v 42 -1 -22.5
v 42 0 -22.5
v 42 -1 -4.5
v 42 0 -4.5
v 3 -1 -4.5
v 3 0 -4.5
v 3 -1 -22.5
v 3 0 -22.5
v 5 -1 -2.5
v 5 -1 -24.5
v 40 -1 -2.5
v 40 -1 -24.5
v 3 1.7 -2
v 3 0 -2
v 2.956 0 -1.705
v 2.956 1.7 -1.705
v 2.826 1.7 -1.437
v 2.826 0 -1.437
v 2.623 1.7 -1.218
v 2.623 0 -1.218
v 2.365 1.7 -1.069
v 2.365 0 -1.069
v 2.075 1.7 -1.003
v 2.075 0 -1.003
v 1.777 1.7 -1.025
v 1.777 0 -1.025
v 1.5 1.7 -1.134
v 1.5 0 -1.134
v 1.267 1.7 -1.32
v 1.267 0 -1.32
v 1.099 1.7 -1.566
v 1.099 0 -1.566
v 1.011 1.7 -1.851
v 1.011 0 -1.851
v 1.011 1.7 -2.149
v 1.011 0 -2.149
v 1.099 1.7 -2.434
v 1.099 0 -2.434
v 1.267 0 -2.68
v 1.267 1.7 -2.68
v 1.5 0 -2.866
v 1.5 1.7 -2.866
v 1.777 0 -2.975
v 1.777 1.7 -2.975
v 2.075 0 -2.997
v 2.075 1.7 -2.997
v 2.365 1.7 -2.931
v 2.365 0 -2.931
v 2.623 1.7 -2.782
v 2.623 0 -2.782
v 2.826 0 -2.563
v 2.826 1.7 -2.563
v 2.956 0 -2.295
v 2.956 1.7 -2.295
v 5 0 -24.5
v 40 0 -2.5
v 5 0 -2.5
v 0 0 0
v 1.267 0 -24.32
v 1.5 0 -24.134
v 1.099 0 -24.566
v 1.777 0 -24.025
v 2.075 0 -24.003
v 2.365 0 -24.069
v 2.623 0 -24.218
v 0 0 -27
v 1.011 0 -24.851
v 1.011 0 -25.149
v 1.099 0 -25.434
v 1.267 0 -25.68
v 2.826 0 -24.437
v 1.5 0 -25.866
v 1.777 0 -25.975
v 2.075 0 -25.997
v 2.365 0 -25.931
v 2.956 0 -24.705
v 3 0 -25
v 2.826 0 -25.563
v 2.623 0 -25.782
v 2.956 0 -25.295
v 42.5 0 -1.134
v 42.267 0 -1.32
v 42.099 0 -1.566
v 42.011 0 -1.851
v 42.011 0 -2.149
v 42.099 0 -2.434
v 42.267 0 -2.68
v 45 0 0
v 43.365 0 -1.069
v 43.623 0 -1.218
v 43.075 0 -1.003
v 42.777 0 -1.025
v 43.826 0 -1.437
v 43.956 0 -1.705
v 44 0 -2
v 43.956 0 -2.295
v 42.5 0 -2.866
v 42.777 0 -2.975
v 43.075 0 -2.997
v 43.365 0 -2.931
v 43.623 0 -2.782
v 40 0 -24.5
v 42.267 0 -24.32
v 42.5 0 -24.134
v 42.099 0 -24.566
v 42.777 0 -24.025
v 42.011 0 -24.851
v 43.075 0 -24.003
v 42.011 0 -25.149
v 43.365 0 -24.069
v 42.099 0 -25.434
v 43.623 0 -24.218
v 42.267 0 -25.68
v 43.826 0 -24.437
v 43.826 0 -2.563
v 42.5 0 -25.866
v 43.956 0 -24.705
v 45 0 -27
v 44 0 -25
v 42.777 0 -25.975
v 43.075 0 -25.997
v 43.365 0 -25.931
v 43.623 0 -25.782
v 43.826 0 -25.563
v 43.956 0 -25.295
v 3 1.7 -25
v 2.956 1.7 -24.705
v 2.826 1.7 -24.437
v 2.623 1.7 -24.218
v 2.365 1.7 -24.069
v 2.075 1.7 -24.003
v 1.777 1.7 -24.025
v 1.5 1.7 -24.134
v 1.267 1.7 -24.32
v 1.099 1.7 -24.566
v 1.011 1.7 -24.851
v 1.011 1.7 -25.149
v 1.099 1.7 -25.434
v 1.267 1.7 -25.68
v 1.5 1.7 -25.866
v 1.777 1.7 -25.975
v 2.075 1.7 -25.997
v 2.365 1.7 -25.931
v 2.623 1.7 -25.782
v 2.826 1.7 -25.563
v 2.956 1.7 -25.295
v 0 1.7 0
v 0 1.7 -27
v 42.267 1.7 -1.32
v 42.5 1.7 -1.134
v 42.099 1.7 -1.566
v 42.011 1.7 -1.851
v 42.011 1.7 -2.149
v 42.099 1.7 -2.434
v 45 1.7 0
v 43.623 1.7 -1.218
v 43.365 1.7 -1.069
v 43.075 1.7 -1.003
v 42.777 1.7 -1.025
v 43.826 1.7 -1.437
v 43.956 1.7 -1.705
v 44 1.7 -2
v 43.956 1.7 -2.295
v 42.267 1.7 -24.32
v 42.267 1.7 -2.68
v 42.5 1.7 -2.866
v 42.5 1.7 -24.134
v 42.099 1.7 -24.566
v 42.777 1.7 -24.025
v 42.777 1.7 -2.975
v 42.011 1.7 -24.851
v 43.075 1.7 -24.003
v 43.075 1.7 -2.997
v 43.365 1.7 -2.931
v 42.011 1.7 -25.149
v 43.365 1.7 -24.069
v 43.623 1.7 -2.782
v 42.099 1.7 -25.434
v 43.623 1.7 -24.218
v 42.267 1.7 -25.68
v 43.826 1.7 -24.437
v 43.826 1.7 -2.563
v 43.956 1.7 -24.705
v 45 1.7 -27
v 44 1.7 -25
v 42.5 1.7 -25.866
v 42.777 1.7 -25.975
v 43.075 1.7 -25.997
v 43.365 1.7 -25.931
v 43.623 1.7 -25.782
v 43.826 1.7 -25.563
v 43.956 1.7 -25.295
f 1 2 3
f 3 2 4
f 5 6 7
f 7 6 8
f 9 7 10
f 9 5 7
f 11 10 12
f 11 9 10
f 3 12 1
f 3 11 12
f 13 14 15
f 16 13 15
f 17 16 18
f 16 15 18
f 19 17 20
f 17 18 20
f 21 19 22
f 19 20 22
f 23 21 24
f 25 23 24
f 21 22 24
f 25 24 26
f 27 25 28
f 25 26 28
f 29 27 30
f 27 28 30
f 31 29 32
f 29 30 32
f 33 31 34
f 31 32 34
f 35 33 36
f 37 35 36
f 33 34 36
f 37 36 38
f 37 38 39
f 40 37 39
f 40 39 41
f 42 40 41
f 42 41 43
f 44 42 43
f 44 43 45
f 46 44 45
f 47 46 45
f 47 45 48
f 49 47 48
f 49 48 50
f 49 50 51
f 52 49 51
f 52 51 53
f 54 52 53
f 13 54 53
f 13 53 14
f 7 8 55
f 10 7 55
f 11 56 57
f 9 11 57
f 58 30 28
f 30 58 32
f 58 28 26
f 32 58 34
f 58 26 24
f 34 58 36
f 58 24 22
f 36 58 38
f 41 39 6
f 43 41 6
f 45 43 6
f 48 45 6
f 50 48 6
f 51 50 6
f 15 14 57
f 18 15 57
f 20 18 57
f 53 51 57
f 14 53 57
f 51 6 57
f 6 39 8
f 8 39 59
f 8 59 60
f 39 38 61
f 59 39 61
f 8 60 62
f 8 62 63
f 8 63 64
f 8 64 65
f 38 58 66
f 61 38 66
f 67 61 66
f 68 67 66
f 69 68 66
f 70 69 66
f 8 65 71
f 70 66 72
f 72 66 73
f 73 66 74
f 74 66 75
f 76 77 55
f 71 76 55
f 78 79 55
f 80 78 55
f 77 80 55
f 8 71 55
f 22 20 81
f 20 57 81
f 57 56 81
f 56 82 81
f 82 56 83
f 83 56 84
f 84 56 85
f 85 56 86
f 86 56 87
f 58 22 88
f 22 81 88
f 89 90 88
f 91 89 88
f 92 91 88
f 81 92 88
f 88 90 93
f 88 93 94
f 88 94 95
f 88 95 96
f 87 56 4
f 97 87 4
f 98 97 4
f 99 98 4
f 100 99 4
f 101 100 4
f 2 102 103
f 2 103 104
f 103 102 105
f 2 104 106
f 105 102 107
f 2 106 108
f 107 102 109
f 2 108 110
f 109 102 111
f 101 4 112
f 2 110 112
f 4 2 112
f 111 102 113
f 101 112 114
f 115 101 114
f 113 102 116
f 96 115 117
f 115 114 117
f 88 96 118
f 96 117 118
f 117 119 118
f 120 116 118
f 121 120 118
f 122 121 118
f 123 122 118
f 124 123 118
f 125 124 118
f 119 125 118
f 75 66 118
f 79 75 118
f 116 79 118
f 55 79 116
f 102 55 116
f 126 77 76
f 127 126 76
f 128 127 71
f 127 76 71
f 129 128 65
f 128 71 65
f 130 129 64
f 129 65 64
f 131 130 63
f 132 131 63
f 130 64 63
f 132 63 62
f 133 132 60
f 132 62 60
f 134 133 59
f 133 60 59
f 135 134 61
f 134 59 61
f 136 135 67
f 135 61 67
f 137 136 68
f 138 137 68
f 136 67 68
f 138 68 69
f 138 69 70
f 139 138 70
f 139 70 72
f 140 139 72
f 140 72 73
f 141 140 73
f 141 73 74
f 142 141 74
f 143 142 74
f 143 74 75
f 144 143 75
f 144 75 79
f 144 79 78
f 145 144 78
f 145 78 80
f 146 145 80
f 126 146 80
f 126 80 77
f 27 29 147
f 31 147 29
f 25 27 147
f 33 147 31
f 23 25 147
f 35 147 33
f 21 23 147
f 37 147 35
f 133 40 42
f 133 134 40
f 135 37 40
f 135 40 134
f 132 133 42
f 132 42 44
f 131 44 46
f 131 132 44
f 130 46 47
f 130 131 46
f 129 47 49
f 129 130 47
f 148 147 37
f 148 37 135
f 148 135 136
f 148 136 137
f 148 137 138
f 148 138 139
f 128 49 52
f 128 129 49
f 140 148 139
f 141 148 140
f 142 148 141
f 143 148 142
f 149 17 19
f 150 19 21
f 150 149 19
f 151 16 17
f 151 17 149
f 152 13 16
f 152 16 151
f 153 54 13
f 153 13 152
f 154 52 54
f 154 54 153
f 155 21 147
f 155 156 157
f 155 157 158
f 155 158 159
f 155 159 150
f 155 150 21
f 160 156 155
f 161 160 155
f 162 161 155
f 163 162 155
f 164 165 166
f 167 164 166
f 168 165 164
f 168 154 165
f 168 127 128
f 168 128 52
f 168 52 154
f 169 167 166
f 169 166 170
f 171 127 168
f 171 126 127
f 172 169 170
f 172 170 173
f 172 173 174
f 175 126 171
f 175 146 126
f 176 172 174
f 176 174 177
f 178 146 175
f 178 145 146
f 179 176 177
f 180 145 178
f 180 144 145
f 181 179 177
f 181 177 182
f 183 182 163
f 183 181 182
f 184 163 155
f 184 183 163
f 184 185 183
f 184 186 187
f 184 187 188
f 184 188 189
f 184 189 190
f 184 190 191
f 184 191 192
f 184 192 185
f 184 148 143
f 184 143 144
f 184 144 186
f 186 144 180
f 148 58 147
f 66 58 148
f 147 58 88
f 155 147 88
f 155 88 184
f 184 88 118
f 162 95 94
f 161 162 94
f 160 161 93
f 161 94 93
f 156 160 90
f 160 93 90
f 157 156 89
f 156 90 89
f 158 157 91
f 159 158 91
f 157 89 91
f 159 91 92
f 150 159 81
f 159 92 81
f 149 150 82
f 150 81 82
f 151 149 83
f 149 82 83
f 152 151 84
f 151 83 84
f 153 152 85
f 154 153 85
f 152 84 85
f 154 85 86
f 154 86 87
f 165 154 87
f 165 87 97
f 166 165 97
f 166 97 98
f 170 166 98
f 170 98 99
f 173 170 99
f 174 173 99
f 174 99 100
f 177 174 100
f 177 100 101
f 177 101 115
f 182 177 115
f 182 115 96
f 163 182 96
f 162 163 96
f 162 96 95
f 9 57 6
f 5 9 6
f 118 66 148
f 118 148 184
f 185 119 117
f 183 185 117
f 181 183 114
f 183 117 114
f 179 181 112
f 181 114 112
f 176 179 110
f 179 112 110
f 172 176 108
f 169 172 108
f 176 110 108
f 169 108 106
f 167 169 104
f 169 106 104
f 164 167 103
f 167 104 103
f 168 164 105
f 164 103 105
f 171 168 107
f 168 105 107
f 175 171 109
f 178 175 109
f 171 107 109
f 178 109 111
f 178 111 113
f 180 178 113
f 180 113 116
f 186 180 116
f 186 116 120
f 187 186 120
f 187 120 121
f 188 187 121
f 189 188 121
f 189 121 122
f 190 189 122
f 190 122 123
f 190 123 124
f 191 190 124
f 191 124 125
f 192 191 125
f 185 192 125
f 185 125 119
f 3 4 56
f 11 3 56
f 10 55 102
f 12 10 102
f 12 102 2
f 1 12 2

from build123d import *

# Parameters (mm, degrees)
ESBO_O1_W                = 45
ESBO_O1_H                = 27
RESSALTO_EXTRUS_O1_DEPTH = 1.7
RESSALTO_EXTRUS_O2_DEPTH = 1
ESBO_O3_R                = 1
CORTE_EXTRUS_O1_DEPTH    = 2.7


with BuildPart() as part:
    # Esboço1 → Ressalto-extrusão1 (new body)
    with BuildSketch(Plane(origin=(0, 0, 0), x_dir=(1, 0, 0), z_dir=(0, 1, 0))):
        with Locations((22.5, 13.5)):
            Rectangle(ESBO_O1_W, ESBO_O1_H)
    extrude(amount=RESSALTO_EXTRUS_O1_DEPTH)

    # Esboço2 → Ressalto-extrusão2 (add)
    with BuildSketch(Plane.XZ):
        Polygon((3, -22.5), (5, -24.5), (40, -24.5), (42, -22.5), (42, -4.5), (40, -2.5), (5, -2.5), (3, -4.5), align=None)
    extrude(amount=RESSALTO_EXTRUS_O2_DEPTH)

    # Esboço3 → Corte-extrusão1 (cut, through all)
    with BuildSketch(Plane.XZ):
        with Locations((2, -25)):
            Circle(ESBO_O3_R)
        with Locations((43, -25)):
            Circle(ESBO_O3_R)
        with Locations((43, -2)):
            Circle(ESBO_O3_R)
        with Locations((2, -2)):
            Circle(ESBO_O3_R)
    extrude(amount=-CORTE_EXTRUS_O1_DEPTH, mode=Mode.SUBTRACT)


solid = part.part
